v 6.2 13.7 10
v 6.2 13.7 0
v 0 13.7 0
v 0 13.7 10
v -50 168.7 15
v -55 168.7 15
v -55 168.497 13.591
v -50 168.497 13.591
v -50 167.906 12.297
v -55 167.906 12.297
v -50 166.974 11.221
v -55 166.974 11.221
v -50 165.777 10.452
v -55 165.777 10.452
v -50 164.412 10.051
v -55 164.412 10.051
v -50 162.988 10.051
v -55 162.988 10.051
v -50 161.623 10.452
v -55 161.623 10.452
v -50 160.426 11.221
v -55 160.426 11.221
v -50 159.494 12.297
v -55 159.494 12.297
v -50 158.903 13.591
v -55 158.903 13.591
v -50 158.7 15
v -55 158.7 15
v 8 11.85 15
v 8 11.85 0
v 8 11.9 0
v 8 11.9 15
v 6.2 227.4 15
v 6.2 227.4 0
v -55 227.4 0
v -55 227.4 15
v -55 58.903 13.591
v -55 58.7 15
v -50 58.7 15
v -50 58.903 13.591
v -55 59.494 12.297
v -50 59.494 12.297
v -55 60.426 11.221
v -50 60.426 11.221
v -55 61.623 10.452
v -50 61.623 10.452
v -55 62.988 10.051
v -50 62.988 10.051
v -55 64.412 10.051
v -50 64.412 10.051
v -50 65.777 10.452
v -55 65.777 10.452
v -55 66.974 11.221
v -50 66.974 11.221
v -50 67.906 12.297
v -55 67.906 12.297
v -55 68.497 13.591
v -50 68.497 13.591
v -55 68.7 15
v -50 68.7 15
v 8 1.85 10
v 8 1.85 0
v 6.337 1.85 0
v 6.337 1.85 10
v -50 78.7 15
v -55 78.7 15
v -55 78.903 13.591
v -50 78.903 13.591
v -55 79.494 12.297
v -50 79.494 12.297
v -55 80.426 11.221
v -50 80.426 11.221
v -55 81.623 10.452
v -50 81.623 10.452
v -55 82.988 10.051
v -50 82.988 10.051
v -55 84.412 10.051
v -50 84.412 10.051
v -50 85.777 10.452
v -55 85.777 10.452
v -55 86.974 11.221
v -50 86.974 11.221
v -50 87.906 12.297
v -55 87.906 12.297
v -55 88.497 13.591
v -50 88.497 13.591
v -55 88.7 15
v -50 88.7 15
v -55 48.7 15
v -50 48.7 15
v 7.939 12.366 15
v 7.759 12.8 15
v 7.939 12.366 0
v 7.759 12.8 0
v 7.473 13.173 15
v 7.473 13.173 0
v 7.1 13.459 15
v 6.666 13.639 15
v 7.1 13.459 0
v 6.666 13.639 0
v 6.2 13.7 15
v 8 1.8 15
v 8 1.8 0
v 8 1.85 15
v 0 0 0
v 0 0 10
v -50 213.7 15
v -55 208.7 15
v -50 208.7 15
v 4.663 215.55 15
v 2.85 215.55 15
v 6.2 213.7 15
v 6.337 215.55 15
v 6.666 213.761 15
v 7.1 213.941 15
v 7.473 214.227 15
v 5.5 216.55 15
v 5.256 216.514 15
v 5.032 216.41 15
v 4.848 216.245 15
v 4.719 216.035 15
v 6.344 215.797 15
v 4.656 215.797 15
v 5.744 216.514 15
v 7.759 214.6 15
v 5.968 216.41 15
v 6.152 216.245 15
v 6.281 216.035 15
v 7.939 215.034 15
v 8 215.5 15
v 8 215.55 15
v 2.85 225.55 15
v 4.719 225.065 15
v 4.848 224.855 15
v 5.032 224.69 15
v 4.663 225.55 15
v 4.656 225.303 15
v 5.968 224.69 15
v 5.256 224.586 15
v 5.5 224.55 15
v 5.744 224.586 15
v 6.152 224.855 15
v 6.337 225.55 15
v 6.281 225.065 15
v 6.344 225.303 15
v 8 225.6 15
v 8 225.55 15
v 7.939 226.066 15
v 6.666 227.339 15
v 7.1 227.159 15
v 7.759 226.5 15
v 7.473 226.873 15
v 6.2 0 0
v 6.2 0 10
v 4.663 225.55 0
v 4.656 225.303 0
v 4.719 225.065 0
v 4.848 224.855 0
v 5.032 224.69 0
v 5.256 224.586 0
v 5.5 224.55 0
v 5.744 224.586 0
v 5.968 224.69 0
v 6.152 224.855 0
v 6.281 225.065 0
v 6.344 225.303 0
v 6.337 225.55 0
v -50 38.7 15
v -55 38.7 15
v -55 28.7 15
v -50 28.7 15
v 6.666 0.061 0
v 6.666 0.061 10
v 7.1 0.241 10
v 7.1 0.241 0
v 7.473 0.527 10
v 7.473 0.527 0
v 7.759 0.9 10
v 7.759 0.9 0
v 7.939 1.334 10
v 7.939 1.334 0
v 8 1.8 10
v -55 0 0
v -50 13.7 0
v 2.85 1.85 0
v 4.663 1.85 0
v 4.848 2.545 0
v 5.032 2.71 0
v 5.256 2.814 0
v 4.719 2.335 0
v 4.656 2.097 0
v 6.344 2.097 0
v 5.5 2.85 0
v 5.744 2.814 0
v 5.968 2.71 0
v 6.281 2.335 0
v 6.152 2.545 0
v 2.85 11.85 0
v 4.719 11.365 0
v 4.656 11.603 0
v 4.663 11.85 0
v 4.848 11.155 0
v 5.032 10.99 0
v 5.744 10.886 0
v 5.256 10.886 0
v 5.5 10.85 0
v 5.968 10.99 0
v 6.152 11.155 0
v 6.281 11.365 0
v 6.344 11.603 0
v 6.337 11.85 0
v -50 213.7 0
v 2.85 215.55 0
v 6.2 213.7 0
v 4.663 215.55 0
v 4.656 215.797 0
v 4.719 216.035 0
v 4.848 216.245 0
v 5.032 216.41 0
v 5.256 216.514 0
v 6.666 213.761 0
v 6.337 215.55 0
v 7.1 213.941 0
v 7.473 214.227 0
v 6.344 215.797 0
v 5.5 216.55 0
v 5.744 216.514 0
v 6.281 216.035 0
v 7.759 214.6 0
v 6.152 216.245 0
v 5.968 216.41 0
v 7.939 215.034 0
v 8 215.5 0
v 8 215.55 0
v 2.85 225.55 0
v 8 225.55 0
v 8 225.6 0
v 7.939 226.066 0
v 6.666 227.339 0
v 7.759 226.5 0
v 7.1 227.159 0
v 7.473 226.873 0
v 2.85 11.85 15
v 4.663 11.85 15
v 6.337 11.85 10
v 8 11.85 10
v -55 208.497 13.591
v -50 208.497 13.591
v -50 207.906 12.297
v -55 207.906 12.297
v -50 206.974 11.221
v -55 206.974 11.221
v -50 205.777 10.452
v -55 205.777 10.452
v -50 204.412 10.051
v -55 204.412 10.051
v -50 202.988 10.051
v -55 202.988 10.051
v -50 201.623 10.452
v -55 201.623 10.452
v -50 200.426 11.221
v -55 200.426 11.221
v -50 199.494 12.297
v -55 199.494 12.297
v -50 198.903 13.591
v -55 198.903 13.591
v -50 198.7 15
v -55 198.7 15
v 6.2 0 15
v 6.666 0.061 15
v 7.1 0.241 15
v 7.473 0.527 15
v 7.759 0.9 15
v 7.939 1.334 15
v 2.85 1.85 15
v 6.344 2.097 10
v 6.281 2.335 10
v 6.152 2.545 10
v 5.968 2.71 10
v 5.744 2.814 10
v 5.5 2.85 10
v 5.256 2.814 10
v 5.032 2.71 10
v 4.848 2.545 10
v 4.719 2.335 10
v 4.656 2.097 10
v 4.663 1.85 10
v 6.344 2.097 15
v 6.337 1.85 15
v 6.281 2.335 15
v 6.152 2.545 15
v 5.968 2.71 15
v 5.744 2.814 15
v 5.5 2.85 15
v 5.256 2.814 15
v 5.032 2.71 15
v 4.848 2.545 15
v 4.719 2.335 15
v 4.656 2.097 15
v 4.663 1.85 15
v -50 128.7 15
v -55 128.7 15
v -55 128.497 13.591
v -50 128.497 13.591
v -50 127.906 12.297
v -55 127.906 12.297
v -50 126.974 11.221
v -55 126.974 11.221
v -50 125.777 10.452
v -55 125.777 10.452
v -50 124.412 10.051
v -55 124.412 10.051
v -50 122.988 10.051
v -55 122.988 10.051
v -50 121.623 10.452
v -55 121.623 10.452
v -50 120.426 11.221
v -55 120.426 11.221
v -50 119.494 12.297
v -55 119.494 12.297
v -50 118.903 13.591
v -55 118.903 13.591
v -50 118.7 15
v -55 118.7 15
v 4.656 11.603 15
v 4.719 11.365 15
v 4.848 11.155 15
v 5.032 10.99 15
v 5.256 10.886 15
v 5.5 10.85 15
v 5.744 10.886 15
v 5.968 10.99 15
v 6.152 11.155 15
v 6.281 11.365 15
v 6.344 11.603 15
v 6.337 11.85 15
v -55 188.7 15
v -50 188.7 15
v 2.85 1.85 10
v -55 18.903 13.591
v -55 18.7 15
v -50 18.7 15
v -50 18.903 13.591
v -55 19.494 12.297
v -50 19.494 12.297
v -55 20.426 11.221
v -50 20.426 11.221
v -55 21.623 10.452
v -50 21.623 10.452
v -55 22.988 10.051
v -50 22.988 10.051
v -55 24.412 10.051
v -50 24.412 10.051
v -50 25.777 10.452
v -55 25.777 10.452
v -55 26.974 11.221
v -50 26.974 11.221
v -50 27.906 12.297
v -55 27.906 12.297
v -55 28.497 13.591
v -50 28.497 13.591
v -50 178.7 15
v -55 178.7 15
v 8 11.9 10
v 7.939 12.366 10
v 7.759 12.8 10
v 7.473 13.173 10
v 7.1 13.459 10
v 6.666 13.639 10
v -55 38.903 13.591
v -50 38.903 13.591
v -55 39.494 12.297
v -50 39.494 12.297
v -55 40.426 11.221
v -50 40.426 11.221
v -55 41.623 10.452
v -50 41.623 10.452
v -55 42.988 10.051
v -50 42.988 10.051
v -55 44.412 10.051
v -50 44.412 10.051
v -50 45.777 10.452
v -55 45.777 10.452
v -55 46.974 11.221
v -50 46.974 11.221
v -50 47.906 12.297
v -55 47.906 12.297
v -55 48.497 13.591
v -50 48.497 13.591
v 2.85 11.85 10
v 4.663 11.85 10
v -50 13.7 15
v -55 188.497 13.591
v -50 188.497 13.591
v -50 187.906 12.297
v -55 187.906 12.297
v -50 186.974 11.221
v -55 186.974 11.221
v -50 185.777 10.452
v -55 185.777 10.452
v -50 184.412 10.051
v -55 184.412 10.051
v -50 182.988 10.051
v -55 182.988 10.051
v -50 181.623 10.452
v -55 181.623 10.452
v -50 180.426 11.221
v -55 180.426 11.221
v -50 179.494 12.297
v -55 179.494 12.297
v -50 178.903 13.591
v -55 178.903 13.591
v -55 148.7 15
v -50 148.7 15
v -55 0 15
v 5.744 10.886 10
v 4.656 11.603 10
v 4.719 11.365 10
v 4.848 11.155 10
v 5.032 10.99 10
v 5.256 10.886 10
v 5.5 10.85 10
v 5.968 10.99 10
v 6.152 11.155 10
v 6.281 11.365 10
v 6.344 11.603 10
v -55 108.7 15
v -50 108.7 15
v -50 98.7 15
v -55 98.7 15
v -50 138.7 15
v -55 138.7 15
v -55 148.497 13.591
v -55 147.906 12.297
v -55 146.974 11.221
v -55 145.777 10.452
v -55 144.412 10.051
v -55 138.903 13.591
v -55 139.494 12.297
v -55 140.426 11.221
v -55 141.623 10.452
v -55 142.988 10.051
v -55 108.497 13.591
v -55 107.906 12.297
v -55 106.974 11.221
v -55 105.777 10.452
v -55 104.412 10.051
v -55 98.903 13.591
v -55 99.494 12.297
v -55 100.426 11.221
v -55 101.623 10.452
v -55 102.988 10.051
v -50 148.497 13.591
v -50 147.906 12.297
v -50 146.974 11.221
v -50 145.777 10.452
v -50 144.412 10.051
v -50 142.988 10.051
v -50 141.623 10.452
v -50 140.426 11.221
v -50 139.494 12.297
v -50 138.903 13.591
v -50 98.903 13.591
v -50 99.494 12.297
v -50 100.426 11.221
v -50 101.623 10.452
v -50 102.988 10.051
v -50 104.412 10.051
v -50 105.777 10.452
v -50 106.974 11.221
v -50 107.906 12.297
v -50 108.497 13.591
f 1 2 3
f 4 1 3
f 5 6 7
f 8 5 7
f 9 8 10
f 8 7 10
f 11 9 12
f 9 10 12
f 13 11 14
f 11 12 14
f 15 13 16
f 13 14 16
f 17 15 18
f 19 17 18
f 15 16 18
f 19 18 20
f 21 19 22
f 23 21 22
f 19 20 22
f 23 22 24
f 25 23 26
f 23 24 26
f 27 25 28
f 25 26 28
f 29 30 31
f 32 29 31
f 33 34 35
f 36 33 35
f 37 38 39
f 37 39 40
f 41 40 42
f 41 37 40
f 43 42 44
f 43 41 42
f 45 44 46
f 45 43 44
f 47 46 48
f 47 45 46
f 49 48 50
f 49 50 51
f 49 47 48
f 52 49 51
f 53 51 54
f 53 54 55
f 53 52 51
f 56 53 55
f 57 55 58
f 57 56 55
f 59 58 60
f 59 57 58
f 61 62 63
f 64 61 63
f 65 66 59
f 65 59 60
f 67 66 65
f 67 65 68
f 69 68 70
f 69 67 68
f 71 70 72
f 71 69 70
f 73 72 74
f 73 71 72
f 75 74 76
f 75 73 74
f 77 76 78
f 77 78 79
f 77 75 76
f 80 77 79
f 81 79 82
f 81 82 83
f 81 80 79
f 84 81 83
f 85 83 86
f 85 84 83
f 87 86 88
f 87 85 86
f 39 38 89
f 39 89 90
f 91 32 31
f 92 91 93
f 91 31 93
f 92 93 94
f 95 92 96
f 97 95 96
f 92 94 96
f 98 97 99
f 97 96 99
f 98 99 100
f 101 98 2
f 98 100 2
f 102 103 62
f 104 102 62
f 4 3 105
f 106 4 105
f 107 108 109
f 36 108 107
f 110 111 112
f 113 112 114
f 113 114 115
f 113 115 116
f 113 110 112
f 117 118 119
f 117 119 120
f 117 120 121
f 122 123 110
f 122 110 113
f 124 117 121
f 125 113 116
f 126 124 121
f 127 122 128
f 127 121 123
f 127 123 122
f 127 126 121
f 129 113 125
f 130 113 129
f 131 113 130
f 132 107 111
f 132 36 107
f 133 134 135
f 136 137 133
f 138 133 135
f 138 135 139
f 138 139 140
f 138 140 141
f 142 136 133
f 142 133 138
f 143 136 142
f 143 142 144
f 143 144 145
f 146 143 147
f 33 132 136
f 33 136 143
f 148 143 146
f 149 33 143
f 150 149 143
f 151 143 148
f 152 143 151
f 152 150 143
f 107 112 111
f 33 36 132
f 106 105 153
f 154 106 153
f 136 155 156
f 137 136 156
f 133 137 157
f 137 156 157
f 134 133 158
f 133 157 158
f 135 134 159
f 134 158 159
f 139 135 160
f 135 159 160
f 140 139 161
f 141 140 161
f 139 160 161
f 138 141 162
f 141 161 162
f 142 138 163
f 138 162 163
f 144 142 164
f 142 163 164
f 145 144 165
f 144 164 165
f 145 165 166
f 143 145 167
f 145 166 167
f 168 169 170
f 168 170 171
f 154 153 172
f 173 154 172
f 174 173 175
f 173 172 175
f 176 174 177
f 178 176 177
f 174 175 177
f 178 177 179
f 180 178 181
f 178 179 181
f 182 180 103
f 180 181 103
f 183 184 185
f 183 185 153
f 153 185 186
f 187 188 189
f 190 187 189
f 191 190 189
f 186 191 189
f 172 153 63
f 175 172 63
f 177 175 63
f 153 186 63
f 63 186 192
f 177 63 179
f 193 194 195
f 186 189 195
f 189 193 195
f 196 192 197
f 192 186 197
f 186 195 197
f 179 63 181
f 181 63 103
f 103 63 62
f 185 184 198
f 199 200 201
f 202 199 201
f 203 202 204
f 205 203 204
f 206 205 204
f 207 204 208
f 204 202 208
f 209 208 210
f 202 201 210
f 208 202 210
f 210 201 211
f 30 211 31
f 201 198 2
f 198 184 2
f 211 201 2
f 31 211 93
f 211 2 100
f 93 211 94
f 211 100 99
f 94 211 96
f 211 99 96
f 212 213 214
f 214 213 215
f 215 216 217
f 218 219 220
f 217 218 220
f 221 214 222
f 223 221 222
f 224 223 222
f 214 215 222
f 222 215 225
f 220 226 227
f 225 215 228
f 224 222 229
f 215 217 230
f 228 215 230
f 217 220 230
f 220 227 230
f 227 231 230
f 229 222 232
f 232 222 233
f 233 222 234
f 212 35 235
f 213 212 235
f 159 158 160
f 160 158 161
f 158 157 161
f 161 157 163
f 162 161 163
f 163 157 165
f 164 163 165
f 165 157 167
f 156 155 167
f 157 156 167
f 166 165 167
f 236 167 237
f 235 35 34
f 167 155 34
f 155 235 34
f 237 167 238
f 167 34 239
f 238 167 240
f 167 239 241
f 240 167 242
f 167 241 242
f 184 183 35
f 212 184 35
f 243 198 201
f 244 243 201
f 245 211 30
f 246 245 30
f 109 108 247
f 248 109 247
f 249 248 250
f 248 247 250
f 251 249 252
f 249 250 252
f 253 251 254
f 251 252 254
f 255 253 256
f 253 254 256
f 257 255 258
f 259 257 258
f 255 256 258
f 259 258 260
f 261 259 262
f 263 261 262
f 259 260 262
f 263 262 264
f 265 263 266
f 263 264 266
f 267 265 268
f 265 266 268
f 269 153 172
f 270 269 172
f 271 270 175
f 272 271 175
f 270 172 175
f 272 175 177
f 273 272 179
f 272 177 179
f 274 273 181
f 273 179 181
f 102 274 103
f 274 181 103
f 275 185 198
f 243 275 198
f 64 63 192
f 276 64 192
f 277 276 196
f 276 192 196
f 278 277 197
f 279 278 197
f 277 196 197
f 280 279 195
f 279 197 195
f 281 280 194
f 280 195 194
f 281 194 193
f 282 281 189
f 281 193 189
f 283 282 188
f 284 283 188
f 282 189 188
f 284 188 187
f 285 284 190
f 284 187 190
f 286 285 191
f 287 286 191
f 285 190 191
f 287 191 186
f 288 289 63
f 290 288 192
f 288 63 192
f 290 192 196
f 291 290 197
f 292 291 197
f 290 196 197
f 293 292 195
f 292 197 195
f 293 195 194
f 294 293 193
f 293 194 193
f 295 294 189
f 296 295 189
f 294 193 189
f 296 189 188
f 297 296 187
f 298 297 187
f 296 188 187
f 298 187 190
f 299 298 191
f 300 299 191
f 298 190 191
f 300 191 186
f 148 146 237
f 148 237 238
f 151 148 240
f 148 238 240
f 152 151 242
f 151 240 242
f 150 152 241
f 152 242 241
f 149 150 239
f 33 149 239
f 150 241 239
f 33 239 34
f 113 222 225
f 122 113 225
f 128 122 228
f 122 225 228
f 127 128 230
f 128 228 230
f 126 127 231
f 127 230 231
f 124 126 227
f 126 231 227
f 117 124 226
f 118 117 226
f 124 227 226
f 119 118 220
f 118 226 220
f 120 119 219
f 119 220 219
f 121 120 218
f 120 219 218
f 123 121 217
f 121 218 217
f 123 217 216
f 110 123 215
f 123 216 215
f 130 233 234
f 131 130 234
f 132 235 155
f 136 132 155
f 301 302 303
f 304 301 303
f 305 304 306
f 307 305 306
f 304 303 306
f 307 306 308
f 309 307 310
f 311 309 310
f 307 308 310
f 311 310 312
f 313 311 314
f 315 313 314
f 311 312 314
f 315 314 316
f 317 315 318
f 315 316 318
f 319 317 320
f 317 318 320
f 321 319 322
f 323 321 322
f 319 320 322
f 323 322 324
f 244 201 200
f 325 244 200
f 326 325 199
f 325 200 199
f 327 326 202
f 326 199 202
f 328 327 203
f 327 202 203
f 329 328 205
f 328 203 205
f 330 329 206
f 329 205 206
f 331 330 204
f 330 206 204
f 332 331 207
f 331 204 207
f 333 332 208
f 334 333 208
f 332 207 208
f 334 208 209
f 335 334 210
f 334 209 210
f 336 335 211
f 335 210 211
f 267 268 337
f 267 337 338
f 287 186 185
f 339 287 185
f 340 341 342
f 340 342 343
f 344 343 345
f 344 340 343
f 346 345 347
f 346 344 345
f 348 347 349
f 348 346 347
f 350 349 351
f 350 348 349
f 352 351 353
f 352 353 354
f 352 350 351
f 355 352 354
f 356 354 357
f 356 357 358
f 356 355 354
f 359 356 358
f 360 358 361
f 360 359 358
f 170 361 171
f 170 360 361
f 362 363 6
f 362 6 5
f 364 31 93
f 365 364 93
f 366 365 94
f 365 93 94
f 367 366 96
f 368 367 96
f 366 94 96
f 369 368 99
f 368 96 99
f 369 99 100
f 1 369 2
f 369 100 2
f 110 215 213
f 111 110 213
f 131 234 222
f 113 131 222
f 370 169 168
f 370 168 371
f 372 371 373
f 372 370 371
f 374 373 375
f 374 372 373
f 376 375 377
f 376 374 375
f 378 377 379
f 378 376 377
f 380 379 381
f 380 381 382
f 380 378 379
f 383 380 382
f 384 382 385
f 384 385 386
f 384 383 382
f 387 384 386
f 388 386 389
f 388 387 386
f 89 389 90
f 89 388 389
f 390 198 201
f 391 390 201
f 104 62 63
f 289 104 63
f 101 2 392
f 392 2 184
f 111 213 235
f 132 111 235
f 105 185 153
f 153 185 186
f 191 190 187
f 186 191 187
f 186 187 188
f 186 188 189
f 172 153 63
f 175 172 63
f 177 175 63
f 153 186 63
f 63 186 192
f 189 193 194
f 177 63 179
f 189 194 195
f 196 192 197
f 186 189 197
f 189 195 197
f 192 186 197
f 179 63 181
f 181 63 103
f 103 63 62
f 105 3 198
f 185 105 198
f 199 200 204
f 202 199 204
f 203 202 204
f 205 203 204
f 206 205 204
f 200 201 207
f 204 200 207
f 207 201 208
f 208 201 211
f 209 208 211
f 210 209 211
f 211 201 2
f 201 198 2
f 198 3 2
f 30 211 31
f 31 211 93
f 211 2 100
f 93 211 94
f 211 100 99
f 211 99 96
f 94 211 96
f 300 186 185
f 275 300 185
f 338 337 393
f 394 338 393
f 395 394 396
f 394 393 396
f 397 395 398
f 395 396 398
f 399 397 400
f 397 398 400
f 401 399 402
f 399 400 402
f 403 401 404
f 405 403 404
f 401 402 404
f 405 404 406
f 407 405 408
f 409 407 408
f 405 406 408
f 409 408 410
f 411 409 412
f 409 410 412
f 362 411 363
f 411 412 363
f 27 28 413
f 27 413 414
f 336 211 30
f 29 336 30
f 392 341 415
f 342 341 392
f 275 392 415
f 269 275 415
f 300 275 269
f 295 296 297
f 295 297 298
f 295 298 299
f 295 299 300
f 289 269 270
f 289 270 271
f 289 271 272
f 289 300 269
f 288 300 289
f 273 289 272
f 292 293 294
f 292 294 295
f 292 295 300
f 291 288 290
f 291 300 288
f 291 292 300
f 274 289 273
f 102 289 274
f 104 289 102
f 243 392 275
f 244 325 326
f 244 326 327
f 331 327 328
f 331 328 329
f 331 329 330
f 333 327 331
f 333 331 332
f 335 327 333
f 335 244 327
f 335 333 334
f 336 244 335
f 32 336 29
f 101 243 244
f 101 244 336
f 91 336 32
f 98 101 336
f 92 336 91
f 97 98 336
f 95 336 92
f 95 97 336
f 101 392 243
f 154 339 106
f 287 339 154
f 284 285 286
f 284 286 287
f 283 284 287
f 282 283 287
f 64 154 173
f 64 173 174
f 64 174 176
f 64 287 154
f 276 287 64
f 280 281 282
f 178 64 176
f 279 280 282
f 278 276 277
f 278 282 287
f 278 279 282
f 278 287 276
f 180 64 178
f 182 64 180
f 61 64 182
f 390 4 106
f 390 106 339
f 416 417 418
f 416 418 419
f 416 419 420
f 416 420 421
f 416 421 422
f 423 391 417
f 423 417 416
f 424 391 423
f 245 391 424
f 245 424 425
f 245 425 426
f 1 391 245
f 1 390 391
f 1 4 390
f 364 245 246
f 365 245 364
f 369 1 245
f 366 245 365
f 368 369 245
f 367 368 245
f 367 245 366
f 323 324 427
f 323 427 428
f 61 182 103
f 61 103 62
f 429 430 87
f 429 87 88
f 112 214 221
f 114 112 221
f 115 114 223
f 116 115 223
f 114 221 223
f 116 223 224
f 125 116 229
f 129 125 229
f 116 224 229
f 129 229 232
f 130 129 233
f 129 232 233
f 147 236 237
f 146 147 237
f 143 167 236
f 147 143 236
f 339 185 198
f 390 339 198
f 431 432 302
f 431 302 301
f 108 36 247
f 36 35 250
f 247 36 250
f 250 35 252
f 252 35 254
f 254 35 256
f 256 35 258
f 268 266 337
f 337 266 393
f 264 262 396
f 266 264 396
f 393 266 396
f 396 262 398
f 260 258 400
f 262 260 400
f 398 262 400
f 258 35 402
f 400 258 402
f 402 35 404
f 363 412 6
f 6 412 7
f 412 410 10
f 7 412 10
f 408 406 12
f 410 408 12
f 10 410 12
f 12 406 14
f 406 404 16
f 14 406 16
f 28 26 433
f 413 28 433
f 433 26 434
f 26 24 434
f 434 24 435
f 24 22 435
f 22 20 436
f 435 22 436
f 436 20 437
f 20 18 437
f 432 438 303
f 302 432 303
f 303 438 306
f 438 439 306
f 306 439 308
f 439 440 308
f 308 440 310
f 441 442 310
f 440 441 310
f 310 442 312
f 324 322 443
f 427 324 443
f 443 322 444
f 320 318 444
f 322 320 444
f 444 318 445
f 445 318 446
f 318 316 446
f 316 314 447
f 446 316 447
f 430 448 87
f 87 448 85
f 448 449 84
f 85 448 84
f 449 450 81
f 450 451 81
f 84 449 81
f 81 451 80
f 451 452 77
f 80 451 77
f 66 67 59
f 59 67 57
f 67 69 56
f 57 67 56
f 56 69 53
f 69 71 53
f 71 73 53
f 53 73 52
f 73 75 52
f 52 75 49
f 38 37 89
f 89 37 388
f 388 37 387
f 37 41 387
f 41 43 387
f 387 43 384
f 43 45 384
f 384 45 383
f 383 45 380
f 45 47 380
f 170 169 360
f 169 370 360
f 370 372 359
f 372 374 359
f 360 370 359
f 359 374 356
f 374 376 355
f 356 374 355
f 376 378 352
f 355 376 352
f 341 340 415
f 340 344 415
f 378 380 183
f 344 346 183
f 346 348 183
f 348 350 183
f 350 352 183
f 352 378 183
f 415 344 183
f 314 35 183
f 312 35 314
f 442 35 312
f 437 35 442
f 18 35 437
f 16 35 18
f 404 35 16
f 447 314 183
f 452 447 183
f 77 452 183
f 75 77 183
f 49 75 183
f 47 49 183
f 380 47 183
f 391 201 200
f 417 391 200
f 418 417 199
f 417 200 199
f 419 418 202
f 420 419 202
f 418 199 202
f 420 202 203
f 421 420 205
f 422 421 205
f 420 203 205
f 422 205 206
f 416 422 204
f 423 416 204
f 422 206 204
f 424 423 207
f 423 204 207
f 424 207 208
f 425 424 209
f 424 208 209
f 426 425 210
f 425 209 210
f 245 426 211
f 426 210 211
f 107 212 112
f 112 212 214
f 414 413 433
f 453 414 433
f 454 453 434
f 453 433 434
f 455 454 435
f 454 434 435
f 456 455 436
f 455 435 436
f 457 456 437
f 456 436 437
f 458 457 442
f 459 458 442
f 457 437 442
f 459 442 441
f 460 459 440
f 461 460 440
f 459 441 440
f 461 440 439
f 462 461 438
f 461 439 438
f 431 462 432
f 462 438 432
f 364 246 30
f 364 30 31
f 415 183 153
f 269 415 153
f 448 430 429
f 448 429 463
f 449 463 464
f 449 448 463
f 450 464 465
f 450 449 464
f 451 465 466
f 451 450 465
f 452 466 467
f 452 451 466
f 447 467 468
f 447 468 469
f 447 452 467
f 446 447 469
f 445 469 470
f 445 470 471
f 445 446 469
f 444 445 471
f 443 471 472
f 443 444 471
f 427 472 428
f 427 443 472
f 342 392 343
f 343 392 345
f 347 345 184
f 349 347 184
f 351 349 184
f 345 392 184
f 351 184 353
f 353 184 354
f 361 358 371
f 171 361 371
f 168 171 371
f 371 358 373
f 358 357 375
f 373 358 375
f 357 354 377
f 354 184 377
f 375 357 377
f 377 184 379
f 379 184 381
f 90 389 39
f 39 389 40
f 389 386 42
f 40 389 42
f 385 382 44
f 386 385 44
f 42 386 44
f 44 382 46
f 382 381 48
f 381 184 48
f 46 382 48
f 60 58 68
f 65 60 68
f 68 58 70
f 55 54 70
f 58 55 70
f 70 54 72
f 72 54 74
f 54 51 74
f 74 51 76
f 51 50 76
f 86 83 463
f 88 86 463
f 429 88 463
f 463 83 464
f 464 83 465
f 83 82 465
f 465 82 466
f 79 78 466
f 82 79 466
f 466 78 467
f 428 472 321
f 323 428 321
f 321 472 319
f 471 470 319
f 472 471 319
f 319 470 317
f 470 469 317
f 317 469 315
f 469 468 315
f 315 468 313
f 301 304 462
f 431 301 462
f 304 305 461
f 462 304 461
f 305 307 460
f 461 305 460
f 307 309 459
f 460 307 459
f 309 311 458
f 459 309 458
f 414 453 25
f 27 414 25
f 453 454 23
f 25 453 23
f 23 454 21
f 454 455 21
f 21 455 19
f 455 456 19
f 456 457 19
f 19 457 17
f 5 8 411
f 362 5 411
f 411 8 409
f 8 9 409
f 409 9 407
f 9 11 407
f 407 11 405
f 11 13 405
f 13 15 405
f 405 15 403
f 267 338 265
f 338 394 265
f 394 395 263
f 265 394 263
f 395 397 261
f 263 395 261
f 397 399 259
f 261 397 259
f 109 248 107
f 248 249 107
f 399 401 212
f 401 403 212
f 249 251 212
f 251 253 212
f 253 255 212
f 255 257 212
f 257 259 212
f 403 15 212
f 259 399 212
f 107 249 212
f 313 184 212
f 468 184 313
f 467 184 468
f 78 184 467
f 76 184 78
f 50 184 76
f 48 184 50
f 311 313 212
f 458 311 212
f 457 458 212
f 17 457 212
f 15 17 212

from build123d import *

# Parameters (mm, degrees)
BOSS_EXTRUDE1_DEPTH = 10
BOSS_EXTRUDE2_DEPTH = 15
CUT_EXTRUDE4_DEPTH  = 5


with BuildPart() as part:
    # Sketch4 → Boss-Extrude1 (new body)
    with BuildSketch(Plane.XY):
        with BuildLine():
            Line((0, 13.7), (0, 0))
            Line((0, 0), (6.2, 0))
            ThreePointArc((6.2, 0), (7.472792206, 0.527207794), (8, 1.8))
            Line((8, 1.8), (8, 1.85))
            Line((8, 1.85), (6.336660027, 1.85))
            Line((6.336660027, 1.85), (4.663339973, 1.85))
            Line((4.663339973, 1.85), (2.85, 1.85))
            Line((2.85, 1.85), (2.85, 11.85))
            Line((2.85, 11.85), (4.663339973, 11.85))
            Line((4.663339973, 11.85), (6.336660027, 11.85))
            Line((6.336660027, 11.85), (8, 11.85))
            Line((8, 11.85), (8, 11.9))
            ThreePointArc((8, 11.9), (7.472792206, 13.172792206), (6.2, 13.7))
            Line((6.2, 13.7), (0, 13.7))
        make_face()
        with BuildLine():
            ThreePointArc((4.663339973, 11.85), (5.5, 10.85), (6.336660027, 11.85))
            Line((6.336660027, 11.85), (4.663339973, 11.85))
        make_face()
        with BuildLine():
            Line((4.663339973, 1.85), (6.336660027, 1.85))
            ThreePointArc((6.336660027, 1.85), (5.5, 2.85), (4.663339973, 1.85))
        make_face()
    extrude(amount=BOSS_EXTRUDE1_DEPTH)


with BuildPart() as body_2:
    # Sketch4<5> → Boss-Extrude2 (new body)
    with BuildSketch(Plane.XY):
        with BuildLine():
            Line((0, 13.7), (0, 0))
            Line((0, 0), (6.2, 0))
            ThreePointArc((6.2, 0), (7.472792206, 0.527207794), (8, 1.8))
            Line((8, 1.8), (8, 1.85))
            Line((8, 1.85), (6.336660027, 1.85))
            Line((6.336660027, 1.85), (4.663339973, 1.85))
            Line((4.663339973, 1.85), (2.85, 1.85))
            Line((2.85, 1.85), (2.85, 11.85))
            Line((2.85, 11.85), (4.663339973, 11.85))
            Line((4.663339973, 11.85), (6.336660027, 11.85))
            Line((6.336660027, 11.85), (8, 11.85))
            Line((8, 11.85), (8, 11.9))
            ThreePointArc((8, 11.9), (7.472792206, 13.172792206), (6.2, 13.7))
            Line((6.2, 13.7), (0, 13.7))
        make_face()
        Polygon((-55, 0), (0, 0), (0, 13.7), (-50, 13.7), (-50, 113.7), (-55, 113.7), align=None)
        Polygon((-55, 227.4), (-55, 113.7), (-50, 113.7), (-50, 213.7), (0, 213.7), (0, 227.4), align=None)
        with BuildLine():
            Line((6.2, 227.4), (0, 227.4))
            Line((0, 227.4), (0, 213.7))
            Line((0, 213.7), (6.2, 213.7))
            ThreePointArc((6.2, 213.7), (7.472792206, 214.227207794), (8, 215.5))
            Line((8, 215.5), (8, 215.55))
            Line((8, 215.55), (6.336660027, 215.55))
            Line((6.336660027, 215.55), (4.663339973, 215.55))
            Line((4.663339973, 215.55), (2.85, 215.55))
            Line((2.85, 215.55), (2.85, 225.55))
            Line((2.85, 225.55), (4.663339973, 225.55))
            Line((4.663339973, 225.55), (6.336660027, 225.55))
            Line((6.336660027, 225.55), (8, 225.55))
            Line((8, 225.55), (8, 225.6))
            ThreePointArc((8, 225.6), (7.472792206, 226.872792206), (6.2, 227.4))
        make_face()
        with BuildLine():
            ThreePointArc((4.663339973, 225.55), (5.5, 224.55), (6.336660027, 225.55))
            Line((6.336660027, 225.55), (4.663339973, 225.55))
        make_face()
        with BuildLine():
            Line((4.663339973, 215.55), (6.336660027, 215.55))
            ThreePointArc((6.336660027, 215.55), (5.5, 216.55), (4.663339973, 215.55))
        make_face()
        with BuildLine():
            Line((4.663339973, 1.85), (6.336660027, 1.85))
            ThreePointArc((6.336660027, 1.85), (5.5, 2.85), (4.663339973, 1.85))
        make_face()
        with BuildLine():
            ThreePointArc((4.663339973, 11.85), (5.5, 10.85), (6.336660027, 11.85))
            Line((6.336660027, 11.85), (4.663339973, 11.85))
        make_face()
    extrude(amount=BOSS_EXTRUDE2_DEPTH)

    # Sketch5 → Cut-Extrude4 (cut)
    with BuildSketch(Plane.ZY.offset(55)):
        with BuildLine():
            Line((15, 88.7), (15, 78.7))
            ThreePointArc((15, 78.7), (10, 83.7), (15, 88.7))
        make_face()
        with BuildLine():
            Line((15, 108.7), (15, 98.7))
            ThreePointArc((15, 98.7), (10, 103.7), (15, 108.7))
        make_face()
        with BuildLine():
            Line((15, 68.7), (15, 58.7))
            ThreePointArc((15, 58.7), (10, 63.7), (15, 68.7))
        make_face()
        with BuildLine():
            Line((15, 48.7), (15, 38.7))
            ThreePointArc((15, 38.7), (10, 43.7), (15, 48.7))
        make_face()
        with BuildLine():
            Line((15, 28.7), (15, 18.7))
            ThreePointArc((15, 18.7), (10, 23.7), (15, 28.7))
        make_face()
        with BuildLine():
            Line((15, 118.7), (15, 128.7))
            ThreePointArc((15, 128.7), (10, 123.7), (15, 118.7))
        make_face()
        with BuildLine():
            Line((15, 198.7), (15, 208.7))
            ThreePointArc((15, 208.7), (10, 203.7), (15, 198.7))
        make_face()
        with BuildLine():
            Line((15, 178.7), (15, 188.7))
            ThreePointArc((15, 188.7), (10, 183.7), (15, 178.7))
        make_face()
        with BuildLine():
            Line((15, 158.7), (15, 168.7))
            ThreePointArc((15, 168.7), (10, 163.7), (15, 158.7))
        make_face()
        with BuildLine():
            Line((15, 138.7), (15, 148.7))
            ThreePointArc((15, 148.7), (10, 143.7), (15, 138.7))
        make_face()
    extrude(amount=-CUT_EXTRUDE4_DEPTH, mode=Mode.SUBTRACT)


solid = Compound([part.part, body_2.part])
